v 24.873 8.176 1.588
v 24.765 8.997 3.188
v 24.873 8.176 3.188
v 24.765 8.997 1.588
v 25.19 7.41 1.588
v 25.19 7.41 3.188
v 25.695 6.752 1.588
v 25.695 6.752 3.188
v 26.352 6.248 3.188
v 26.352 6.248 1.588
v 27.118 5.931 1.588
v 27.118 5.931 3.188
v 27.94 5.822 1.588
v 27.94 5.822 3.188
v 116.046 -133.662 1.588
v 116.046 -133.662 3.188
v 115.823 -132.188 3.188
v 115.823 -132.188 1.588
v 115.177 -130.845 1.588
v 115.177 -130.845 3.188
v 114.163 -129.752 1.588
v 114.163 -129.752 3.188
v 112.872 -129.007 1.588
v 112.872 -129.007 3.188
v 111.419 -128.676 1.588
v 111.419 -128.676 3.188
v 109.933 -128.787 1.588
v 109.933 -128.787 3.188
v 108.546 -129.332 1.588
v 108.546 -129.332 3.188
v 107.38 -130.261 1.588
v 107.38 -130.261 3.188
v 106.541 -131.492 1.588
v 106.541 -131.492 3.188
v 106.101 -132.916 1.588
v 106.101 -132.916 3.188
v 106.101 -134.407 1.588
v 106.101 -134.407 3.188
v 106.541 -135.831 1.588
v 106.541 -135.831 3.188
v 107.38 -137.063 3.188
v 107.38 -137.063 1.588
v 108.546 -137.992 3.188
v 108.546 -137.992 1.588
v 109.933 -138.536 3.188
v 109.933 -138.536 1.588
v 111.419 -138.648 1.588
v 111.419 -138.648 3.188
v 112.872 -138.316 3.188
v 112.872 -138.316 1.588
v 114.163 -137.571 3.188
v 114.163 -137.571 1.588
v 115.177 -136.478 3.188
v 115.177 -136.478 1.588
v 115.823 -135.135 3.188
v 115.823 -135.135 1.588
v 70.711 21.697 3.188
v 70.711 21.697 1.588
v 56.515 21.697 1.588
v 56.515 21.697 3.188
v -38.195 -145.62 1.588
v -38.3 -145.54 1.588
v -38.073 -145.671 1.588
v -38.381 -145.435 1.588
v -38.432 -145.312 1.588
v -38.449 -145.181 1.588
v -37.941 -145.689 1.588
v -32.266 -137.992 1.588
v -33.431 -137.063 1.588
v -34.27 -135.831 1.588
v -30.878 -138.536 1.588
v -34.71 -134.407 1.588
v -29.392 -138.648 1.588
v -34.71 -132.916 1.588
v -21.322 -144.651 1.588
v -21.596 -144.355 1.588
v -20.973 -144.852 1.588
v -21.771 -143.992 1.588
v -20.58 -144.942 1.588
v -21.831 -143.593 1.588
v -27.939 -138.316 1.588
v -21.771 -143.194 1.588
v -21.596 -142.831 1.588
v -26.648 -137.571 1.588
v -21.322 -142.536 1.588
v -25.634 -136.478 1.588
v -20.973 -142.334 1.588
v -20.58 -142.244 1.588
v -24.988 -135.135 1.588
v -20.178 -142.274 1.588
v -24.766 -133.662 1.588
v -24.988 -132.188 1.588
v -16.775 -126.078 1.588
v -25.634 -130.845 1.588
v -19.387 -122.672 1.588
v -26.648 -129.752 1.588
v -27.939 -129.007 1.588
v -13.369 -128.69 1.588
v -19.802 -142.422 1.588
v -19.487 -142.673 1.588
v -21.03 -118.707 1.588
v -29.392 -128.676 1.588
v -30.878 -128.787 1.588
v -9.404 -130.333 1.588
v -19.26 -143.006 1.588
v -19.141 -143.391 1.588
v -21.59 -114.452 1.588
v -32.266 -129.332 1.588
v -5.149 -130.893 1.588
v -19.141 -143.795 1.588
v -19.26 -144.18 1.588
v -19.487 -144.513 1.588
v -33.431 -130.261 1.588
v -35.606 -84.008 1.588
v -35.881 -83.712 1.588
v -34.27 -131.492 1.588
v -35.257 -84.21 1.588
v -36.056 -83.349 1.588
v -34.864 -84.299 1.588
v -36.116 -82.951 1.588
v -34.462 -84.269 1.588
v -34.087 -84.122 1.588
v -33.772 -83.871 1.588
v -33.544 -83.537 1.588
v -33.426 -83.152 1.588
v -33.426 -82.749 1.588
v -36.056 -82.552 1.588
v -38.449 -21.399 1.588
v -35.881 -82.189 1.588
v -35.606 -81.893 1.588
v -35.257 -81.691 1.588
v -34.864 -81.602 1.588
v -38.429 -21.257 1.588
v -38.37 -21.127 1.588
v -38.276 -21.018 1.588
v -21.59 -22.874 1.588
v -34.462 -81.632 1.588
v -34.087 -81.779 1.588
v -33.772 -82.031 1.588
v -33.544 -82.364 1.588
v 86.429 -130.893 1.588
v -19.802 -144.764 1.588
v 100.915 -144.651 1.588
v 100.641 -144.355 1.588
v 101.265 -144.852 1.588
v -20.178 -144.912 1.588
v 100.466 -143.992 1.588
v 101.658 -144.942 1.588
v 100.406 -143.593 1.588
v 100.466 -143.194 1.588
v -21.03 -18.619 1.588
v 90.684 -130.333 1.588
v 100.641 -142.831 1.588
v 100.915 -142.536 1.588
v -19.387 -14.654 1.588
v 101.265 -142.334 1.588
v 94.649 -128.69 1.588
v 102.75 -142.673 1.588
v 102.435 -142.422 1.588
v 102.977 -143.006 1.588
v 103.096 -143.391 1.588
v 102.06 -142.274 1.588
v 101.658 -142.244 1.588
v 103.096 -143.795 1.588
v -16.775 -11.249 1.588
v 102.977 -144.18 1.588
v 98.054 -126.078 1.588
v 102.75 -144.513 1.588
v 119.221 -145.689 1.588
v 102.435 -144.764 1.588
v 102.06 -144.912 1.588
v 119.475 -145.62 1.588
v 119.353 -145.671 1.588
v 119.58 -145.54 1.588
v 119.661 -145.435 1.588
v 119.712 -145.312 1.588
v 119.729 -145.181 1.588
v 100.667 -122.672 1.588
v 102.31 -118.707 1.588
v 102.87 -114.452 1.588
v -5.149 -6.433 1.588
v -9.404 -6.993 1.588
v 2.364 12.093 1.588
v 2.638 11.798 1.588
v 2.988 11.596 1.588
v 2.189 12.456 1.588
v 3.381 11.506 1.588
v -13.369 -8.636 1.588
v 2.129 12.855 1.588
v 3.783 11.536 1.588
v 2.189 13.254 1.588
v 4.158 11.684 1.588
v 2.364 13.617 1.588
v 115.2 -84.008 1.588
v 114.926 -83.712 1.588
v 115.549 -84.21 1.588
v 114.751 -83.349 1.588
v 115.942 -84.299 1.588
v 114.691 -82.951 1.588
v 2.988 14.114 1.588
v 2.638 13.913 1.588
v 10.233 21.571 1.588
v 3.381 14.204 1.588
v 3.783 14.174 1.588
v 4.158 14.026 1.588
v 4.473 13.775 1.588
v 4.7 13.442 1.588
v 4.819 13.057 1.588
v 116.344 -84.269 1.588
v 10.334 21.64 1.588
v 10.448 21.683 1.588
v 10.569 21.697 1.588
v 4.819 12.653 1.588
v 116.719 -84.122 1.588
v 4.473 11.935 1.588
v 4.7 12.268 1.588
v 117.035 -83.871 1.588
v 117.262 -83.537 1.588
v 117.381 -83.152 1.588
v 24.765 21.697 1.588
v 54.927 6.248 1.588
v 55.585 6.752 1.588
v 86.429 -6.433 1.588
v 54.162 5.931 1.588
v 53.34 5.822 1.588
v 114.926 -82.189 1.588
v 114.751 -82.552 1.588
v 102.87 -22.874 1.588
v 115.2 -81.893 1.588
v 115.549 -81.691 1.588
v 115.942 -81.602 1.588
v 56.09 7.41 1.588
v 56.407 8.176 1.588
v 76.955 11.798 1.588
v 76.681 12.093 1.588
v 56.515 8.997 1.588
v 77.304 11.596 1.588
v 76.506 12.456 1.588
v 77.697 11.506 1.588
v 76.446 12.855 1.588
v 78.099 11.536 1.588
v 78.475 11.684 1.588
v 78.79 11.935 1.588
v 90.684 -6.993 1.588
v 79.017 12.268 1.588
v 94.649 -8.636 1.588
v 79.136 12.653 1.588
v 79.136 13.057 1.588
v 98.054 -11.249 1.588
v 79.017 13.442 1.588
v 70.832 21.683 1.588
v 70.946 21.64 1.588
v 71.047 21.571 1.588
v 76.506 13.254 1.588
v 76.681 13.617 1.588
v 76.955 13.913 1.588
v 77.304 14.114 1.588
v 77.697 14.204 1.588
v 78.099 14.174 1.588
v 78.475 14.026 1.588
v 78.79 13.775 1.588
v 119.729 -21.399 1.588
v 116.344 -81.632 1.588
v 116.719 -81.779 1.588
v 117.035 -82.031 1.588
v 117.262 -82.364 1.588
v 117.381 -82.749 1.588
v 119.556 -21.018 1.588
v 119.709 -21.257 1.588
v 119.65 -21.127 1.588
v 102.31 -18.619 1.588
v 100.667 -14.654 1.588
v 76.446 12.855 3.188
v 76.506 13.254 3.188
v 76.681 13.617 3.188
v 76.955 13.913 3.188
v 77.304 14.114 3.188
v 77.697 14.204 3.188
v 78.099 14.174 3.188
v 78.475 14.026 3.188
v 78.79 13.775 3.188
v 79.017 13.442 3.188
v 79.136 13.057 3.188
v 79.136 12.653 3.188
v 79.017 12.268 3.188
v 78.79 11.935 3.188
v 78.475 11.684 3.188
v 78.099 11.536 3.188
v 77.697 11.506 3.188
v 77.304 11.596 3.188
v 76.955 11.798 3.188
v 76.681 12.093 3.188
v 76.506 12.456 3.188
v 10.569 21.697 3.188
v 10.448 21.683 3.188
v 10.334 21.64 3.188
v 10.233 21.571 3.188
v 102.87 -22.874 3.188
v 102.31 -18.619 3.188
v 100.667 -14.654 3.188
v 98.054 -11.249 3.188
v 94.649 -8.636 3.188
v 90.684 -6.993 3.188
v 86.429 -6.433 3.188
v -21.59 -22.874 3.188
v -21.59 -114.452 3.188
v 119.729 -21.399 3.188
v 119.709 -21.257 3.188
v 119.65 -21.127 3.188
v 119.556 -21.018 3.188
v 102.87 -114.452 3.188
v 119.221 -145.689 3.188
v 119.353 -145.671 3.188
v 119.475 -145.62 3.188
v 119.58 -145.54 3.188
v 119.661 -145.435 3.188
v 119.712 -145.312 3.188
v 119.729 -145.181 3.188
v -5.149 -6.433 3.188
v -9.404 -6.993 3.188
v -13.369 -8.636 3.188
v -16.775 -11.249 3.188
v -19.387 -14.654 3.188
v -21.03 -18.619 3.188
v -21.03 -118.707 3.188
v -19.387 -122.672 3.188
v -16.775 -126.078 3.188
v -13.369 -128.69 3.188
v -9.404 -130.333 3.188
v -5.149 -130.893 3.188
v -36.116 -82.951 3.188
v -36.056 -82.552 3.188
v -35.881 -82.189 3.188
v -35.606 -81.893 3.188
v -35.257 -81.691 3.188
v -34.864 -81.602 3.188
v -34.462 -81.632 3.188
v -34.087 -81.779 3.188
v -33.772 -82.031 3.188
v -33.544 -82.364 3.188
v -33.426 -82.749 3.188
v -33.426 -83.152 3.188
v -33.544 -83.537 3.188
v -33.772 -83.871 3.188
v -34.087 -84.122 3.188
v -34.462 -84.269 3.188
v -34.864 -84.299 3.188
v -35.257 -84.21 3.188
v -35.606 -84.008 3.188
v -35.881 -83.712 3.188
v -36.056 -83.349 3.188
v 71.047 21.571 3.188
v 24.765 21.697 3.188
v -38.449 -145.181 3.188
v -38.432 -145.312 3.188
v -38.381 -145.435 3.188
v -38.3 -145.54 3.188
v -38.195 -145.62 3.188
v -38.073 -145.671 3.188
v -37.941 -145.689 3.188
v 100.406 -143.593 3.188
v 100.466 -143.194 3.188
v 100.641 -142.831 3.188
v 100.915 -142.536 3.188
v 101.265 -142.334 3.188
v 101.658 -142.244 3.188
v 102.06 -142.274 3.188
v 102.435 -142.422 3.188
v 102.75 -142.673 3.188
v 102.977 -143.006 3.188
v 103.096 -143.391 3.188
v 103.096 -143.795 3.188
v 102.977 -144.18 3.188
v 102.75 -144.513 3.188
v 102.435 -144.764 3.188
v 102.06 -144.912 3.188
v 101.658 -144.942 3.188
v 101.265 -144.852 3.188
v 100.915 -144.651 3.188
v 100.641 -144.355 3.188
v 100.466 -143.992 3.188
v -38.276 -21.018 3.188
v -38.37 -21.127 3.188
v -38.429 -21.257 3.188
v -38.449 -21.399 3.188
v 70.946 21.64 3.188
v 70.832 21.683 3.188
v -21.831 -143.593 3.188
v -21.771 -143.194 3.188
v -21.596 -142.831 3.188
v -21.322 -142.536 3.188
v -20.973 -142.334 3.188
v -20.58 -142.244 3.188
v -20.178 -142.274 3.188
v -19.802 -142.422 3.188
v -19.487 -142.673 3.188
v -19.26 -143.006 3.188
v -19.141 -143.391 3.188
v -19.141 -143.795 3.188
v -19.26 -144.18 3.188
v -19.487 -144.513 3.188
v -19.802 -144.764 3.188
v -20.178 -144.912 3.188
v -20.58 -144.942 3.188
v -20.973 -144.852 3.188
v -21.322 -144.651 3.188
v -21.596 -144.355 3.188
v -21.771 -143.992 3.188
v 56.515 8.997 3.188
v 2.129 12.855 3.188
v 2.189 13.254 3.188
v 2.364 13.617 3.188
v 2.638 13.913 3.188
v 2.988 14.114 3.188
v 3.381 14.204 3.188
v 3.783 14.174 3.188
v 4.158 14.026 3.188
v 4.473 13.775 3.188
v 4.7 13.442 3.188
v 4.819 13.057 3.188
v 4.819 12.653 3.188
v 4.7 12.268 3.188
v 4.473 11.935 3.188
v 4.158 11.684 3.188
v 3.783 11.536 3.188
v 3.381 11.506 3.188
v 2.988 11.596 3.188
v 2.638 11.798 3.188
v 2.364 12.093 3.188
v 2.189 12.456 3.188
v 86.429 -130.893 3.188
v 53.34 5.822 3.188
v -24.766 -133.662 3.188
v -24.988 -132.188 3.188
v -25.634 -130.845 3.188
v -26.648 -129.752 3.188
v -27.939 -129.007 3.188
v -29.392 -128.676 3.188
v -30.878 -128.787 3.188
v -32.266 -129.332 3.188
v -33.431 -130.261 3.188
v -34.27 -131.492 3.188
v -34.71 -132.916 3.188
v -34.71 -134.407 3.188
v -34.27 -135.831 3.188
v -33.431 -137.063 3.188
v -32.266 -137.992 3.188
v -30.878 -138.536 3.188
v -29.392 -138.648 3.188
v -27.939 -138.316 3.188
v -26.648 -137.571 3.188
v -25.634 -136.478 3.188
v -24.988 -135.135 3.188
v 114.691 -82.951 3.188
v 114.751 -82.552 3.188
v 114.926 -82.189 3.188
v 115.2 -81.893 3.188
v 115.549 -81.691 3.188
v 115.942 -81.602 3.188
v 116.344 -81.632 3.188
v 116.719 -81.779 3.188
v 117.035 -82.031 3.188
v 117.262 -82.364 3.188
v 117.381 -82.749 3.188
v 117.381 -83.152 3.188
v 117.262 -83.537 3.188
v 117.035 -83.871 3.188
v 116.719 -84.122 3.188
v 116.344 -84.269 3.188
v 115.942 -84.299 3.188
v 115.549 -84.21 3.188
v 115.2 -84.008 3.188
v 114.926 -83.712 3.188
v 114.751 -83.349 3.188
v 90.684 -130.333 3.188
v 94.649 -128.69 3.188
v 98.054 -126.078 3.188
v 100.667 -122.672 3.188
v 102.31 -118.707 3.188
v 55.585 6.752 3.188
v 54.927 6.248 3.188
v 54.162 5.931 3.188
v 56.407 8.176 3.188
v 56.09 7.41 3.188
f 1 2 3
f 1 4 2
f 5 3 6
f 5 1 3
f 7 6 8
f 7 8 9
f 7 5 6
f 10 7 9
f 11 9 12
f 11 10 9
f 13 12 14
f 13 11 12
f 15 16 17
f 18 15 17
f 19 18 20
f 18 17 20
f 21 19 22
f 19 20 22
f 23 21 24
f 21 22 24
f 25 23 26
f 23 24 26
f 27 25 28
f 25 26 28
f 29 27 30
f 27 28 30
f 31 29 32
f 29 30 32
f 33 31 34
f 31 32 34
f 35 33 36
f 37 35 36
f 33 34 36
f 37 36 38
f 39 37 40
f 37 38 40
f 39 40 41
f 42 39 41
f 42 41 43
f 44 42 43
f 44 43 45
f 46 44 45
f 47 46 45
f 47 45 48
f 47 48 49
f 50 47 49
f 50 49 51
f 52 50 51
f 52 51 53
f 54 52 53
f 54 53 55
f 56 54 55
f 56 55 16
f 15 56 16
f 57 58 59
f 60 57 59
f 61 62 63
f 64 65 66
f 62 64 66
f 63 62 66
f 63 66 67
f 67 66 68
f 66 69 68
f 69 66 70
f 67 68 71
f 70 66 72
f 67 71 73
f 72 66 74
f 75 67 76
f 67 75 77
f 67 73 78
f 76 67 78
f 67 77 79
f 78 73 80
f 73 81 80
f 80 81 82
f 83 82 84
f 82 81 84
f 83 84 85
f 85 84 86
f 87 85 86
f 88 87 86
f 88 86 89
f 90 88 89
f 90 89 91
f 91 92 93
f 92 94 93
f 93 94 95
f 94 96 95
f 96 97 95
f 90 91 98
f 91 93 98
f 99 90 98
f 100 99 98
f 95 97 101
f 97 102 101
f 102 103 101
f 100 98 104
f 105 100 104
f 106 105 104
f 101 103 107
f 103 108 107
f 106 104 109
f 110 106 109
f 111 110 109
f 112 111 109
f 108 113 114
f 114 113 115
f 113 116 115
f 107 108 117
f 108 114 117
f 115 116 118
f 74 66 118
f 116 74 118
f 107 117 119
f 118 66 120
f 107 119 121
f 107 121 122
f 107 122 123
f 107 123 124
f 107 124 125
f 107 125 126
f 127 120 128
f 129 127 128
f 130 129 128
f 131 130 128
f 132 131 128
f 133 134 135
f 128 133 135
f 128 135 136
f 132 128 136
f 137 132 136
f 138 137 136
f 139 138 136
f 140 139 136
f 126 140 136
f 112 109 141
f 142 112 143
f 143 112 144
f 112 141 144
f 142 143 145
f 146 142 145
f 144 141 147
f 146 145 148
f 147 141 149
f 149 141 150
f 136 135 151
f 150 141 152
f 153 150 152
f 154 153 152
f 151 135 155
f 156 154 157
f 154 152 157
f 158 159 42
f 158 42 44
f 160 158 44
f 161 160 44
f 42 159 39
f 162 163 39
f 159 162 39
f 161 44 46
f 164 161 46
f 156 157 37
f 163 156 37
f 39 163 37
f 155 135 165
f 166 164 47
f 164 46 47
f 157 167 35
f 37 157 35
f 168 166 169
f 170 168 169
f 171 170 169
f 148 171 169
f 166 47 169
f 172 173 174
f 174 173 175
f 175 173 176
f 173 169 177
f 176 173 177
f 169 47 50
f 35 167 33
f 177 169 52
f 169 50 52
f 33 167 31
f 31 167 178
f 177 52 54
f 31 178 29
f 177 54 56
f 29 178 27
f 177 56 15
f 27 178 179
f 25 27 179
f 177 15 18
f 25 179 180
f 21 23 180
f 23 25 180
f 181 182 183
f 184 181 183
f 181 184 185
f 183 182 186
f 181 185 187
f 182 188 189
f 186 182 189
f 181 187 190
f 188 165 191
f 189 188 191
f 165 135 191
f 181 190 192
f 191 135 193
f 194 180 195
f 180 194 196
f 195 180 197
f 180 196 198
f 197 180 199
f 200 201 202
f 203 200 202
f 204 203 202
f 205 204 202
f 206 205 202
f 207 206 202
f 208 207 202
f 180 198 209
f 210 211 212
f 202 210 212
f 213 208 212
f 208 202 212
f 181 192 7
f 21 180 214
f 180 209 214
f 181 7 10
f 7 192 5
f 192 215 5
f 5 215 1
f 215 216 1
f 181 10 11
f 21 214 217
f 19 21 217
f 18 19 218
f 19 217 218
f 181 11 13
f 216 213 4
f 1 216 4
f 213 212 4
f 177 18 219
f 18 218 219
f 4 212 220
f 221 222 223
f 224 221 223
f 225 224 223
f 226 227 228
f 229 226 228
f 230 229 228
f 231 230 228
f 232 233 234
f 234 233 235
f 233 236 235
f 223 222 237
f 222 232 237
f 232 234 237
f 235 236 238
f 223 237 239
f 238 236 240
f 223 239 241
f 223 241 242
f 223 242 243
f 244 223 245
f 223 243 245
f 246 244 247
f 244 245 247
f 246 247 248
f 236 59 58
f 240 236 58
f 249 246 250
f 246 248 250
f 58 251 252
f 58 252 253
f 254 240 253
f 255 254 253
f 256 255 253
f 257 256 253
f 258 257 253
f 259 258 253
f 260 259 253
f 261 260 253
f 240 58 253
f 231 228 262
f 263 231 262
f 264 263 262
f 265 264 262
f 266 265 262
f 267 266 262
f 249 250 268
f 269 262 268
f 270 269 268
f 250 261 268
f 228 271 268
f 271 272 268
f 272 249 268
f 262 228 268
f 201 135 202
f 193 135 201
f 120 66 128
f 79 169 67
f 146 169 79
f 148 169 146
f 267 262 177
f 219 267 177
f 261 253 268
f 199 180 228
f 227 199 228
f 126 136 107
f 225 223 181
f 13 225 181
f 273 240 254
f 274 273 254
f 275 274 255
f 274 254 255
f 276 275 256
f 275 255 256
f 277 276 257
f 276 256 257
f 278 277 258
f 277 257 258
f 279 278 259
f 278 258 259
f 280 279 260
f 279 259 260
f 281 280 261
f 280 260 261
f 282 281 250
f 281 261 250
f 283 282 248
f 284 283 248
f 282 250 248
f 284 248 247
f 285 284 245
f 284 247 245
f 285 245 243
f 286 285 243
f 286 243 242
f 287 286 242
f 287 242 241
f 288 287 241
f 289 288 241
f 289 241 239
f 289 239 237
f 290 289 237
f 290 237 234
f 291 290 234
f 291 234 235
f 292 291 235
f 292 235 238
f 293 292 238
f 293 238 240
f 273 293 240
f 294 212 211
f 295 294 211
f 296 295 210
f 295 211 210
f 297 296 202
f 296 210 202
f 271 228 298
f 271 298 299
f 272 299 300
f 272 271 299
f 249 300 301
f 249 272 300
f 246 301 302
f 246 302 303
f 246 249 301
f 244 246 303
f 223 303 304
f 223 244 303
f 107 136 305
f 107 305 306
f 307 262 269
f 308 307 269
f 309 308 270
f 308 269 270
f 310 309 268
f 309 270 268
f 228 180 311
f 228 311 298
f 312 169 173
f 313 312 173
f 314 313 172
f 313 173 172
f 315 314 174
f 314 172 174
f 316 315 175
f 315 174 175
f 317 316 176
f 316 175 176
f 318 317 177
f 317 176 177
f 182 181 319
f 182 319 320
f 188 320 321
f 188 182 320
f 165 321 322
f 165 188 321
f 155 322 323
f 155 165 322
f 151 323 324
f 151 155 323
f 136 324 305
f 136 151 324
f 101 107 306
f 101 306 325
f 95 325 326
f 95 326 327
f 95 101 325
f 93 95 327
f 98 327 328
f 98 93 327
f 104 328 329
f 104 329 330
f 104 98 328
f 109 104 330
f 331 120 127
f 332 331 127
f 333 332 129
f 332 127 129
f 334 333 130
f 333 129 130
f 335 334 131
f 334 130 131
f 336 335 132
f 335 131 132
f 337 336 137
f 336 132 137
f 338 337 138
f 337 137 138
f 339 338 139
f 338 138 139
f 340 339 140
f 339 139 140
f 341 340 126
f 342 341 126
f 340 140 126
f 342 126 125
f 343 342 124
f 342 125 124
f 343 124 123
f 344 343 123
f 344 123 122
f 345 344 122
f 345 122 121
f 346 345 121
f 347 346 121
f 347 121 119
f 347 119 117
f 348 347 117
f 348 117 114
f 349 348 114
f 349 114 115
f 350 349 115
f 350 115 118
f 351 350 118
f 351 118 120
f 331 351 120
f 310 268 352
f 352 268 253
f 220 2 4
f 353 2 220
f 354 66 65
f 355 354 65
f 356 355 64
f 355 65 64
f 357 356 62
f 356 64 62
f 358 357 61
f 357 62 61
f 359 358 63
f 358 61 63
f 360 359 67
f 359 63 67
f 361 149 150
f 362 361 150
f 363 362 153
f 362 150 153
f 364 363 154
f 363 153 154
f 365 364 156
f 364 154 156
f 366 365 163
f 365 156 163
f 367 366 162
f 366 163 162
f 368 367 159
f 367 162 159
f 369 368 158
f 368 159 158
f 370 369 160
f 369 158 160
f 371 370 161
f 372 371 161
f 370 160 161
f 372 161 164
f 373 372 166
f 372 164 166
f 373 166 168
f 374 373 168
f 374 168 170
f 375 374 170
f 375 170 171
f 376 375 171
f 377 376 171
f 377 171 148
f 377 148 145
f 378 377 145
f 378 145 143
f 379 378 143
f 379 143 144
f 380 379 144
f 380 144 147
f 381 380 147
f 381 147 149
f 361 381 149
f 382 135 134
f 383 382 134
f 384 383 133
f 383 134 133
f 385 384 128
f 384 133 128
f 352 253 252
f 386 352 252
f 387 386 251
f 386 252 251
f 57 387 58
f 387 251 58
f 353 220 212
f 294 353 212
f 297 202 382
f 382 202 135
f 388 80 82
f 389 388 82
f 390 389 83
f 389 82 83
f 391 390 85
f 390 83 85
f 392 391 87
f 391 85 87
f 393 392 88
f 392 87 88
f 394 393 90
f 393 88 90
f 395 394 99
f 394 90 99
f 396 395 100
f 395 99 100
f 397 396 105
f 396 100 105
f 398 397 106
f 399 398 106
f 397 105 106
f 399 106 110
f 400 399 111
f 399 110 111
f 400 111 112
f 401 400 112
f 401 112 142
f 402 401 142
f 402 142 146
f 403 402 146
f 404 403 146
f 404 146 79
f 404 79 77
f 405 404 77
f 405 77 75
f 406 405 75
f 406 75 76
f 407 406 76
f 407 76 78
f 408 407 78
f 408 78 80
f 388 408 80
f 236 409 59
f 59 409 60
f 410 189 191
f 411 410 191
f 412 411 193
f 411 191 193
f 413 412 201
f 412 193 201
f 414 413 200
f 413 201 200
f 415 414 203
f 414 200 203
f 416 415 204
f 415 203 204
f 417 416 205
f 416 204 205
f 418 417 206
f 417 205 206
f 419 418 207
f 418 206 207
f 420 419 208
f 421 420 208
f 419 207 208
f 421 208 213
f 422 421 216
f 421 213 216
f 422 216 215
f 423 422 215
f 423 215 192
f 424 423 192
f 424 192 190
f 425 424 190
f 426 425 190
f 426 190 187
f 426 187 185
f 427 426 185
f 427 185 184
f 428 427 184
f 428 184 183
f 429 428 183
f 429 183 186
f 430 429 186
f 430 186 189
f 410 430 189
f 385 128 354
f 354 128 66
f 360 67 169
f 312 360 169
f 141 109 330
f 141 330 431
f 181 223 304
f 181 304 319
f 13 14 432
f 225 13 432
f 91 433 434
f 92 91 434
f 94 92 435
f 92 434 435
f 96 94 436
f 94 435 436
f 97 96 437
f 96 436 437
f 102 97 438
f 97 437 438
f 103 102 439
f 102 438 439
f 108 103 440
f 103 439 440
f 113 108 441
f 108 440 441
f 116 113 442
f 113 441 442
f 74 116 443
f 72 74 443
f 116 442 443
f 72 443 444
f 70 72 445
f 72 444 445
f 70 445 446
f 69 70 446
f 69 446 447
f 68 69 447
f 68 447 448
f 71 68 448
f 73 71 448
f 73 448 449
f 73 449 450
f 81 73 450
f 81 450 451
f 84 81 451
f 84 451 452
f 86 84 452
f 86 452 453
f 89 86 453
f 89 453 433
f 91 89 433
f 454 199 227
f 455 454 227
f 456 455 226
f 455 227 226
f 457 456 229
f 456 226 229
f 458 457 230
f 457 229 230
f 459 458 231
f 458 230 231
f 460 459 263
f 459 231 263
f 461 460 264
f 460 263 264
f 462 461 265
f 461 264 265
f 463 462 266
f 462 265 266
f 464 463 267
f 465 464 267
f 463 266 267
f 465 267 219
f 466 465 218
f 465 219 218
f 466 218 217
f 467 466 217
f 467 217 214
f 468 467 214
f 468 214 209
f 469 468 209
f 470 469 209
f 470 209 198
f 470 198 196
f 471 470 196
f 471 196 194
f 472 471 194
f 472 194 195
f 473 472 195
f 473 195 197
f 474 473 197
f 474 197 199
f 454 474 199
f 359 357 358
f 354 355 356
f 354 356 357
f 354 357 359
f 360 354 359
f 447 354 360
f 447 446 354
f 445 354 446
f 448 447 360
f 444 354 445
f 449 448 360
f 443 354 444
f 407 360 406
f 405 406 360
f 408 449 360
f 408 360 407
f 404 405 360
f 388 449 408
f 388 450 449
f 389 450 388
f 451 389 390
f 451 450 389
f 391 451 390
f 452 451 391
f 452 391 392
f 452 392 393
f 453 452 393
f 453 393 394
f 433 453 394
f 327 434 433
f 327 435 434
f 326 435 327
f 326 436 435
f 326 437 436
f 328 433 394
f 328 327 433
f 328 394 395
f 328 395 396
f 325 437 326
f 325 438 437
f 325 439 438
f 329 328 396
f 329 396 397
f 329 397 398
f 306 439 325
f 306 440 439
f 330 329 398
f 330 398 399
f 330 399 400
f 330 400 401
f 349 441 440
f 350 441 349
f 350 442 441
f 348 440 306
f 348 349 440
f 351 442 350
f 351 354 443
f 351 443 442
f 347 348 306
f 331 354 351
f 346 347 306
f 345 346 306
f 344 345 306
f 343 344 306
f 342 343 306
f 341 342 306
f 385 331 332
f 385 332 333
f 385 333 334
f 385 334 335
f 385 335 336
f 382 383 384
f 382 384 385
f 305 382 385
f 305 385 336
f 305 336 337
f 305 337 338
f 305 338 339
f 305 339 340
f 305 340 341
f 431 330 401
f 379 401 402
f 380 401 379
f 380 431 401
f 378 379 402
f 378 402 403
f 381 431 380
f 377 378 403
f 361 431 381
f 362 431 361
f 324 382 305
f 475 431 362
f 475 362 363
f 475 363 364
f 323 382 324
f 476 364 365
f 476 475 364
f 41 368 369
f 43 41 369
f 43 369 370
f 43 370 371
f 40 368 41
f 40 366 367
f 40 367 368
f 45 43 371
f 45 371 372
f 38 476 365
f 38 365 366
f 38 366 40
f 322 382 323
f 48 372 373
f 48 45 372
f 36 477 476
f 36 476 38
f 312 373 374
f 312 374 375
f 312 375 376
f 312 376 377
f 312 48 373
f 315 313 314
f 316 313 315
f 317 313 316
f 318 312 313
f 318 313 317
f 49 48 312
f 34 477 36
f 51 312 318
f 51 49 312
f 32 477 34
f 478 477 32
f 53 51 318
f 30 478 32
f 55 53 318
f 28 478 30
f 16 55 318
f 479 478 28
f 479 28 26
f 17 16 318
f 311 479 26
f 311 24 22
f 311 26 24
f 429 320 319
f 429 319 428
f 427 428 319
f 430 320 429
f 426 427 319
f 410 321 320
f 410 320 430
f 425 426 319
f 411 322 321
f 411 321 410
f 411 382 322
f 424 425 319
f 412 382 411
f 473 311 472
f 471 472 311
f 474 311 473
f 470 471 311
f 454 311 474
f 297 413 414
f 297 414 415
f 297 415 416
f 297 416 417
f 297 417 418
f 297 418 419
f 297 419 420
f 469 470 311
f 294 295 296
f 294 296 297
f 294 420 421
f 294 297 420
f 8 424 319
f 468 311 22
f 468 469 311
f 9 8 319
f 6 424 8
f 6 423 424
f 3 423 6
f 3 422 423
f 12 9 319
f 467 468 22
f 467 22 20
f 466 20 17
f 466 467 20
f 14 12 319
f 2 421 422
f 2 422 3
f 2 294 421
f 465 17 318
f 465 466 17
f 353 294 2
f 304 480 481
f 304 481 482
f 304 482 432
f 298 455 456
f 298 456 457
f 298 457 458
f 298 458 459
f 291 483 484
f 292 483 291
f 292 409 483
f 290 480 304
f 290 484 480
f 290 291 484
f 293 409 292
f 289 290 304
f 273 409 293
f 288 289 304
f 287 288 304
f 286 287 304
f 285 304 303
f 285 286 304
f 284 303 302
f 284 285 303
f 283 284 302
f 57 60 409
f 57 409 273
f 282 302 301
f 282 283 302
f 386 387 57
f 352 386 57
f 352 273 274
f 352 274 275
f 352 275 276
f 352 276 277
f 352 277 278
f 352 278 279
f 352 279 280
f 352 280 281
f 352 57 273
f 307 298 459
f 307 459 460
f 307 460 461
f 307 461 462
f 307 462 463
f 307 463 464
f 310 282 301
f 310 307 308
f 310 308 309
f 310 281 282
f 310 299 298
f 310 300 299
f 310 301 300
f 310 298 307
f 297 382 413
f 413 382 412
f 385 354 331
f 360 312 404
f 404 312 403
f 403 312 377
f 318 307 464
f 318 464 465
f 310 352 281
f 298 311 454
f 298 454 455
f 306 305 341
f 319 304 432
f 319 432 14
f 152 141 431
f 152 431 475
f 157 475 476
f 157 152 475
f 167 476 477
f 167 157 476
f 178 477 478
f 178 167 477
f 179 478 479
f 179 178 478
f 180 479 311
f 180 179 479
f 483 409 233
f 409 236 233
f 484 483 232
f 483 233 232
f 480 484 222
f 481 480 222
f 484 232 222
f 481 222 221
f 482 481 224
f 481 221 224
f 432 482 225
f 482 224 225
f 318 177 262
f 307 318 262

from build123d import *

# Parameters (mm, degrees)
BOSS_EXTRUDE1_DEPTH        = 1.6002
F_2_CLEARANCE_HOLE1_D      = 2.7051
SKETCH8_W                  = 31.75
SKETCH8_H                  = 15.875
CUT_EXTRUDE3_DEPTH         = 2.6002
FILLET1_R                  = 3.175
F_10_0_10_DIAMETER_HOLE1_D = 10


with BuildPart() as part:
    # Sketch2 → Boss-Extrude1 (new body)
    with BuildSketch(Plane.XY.offset(1.5875)):
        with BuildLine():
            Line((70.711408136, 21.697450137), (10.568555904, 21.697450137))
            ThreePointArc((10.568555904, 21.697450137), (10.389483229, 21.664841533), (10.233399988, 21.571201994))
            Line((10.233399988, 21.571201994), (-38.276423867, -21.017595986))
            ThreePointArc((-38.276423867, -21.017595986), (-38.404043925, -21.189818895), (-38.449267951, -21.399347884))
            Line((-38.449267951, -21.399347884), (-38.449267951, -145.180549937))
            ThreePointArc((-38.449267951, -145.180549937), (-38.300478171, -145.539760241), (-37.941267867, -145.688549937))
            Line((-37.941267867, -145.688549937), (119.221232133, -145.688549937))
            ThreePointArc((119.221232133, -145.688549937), (119.580442454, -145.53976015), (119.729232133, -145.18054983))
            Line((119.729232133, -145.18054983), (119.729232133, -21.399347777))
            ThreePointArc((119.729232133, -21.399347777), (119.684008101, -21.189818753), (119.556387965, -21.017595879))
            Line((119.556387965, -21.017595879), (71.046564052, 21.571202036))
            ThreePointArc((71.046564052, 21.571202036), (70.890480797, 21.664841536), (70.711408136, 21.697450137))
        make_face()
        with BuildLine():
            Line((102.869982113, -114.451909481), (102.869982113, -22.874190224))
            ThreePointArc((102.869982113, -22.874190224), (98.05448357, -11.248548333), (86.428841679, -6.433049852))
            Line((86.428841679, -6.433049852), (-5.148877578, -6.433049852))
            ThreePointArc((-5.148877578, -6.433049852), (-16.774519469, -11.248548395), (-21.59001795, -22.874190286))
            Line((-21.59001795, -22.874190286), (-21.59001795, -114.451909543))
            ThreePointArc((-21.59001795, -114.451909543), (-16.774519407, -126.077551434), (-5.148877516, -130.893049915))
            Line((-5.148877516, -130.893049915), (86.428841741, -130.893049915))
            ThreePointArc((86.428841741, -130.893049915), (98.054483632, -126.077551372), (102.869982113, -114.451909481))
        make_face(mode=Mode.SUBTRACT)
    extrude(amount=BOSS_EXTRUDE1_DEPTH)

    # #2 Clearance Hole1 (through all)
    with Locations(Plane.XY.offset(3.1877)):
        with Locations((3.4816648, 12.855075079), (77.798299252, 12.855075129), (-34.763097208, -82.95054975), (116.04306139, -82.950549647), (101.758732132, -143.593049842), (-20.478767868, -143.593049925)):
            Hole(F_2_CLEARANCE_HOLE1_D / 2)

    # Sketch8 → Cut-Extrude3 (cut, through all)
    with BuildSketch(Plane.XY.offset(3.1877)):
        with Locations((40.63998202, 13.759950137)):
            Rectangle(SKETCH8_W, SKETCH8_H)
    extrude(amount=-CUT_EXTRUDE3_DEPTH, mode=Mode.SUBTRACT)

    # Fillet1
    fillet1_edges = [part.edges().sort_by_distance(p)[0] for p in [
        (56.51498202, 5.822450137, 2.3876),
        (24.76498202, 5.822450137, 2.3876),
    ]]
    fillet(fillet1_edges, radius=FILLET1_R)

    # Ø10.0 (10) Diameter Hole1 (through all)
    with Locations(Plane(origin=(0, 0, 1.5875), x_dir=(-1, 0, 0), z_dir=(0, 0, -1))):
        with Locations((-111.045602766, -133.661649696), (29.765638361, -133.661649887)):
            Hole(F_10_0_10_DIAMETER_HOLE1_D / 2)


solid = part.part
